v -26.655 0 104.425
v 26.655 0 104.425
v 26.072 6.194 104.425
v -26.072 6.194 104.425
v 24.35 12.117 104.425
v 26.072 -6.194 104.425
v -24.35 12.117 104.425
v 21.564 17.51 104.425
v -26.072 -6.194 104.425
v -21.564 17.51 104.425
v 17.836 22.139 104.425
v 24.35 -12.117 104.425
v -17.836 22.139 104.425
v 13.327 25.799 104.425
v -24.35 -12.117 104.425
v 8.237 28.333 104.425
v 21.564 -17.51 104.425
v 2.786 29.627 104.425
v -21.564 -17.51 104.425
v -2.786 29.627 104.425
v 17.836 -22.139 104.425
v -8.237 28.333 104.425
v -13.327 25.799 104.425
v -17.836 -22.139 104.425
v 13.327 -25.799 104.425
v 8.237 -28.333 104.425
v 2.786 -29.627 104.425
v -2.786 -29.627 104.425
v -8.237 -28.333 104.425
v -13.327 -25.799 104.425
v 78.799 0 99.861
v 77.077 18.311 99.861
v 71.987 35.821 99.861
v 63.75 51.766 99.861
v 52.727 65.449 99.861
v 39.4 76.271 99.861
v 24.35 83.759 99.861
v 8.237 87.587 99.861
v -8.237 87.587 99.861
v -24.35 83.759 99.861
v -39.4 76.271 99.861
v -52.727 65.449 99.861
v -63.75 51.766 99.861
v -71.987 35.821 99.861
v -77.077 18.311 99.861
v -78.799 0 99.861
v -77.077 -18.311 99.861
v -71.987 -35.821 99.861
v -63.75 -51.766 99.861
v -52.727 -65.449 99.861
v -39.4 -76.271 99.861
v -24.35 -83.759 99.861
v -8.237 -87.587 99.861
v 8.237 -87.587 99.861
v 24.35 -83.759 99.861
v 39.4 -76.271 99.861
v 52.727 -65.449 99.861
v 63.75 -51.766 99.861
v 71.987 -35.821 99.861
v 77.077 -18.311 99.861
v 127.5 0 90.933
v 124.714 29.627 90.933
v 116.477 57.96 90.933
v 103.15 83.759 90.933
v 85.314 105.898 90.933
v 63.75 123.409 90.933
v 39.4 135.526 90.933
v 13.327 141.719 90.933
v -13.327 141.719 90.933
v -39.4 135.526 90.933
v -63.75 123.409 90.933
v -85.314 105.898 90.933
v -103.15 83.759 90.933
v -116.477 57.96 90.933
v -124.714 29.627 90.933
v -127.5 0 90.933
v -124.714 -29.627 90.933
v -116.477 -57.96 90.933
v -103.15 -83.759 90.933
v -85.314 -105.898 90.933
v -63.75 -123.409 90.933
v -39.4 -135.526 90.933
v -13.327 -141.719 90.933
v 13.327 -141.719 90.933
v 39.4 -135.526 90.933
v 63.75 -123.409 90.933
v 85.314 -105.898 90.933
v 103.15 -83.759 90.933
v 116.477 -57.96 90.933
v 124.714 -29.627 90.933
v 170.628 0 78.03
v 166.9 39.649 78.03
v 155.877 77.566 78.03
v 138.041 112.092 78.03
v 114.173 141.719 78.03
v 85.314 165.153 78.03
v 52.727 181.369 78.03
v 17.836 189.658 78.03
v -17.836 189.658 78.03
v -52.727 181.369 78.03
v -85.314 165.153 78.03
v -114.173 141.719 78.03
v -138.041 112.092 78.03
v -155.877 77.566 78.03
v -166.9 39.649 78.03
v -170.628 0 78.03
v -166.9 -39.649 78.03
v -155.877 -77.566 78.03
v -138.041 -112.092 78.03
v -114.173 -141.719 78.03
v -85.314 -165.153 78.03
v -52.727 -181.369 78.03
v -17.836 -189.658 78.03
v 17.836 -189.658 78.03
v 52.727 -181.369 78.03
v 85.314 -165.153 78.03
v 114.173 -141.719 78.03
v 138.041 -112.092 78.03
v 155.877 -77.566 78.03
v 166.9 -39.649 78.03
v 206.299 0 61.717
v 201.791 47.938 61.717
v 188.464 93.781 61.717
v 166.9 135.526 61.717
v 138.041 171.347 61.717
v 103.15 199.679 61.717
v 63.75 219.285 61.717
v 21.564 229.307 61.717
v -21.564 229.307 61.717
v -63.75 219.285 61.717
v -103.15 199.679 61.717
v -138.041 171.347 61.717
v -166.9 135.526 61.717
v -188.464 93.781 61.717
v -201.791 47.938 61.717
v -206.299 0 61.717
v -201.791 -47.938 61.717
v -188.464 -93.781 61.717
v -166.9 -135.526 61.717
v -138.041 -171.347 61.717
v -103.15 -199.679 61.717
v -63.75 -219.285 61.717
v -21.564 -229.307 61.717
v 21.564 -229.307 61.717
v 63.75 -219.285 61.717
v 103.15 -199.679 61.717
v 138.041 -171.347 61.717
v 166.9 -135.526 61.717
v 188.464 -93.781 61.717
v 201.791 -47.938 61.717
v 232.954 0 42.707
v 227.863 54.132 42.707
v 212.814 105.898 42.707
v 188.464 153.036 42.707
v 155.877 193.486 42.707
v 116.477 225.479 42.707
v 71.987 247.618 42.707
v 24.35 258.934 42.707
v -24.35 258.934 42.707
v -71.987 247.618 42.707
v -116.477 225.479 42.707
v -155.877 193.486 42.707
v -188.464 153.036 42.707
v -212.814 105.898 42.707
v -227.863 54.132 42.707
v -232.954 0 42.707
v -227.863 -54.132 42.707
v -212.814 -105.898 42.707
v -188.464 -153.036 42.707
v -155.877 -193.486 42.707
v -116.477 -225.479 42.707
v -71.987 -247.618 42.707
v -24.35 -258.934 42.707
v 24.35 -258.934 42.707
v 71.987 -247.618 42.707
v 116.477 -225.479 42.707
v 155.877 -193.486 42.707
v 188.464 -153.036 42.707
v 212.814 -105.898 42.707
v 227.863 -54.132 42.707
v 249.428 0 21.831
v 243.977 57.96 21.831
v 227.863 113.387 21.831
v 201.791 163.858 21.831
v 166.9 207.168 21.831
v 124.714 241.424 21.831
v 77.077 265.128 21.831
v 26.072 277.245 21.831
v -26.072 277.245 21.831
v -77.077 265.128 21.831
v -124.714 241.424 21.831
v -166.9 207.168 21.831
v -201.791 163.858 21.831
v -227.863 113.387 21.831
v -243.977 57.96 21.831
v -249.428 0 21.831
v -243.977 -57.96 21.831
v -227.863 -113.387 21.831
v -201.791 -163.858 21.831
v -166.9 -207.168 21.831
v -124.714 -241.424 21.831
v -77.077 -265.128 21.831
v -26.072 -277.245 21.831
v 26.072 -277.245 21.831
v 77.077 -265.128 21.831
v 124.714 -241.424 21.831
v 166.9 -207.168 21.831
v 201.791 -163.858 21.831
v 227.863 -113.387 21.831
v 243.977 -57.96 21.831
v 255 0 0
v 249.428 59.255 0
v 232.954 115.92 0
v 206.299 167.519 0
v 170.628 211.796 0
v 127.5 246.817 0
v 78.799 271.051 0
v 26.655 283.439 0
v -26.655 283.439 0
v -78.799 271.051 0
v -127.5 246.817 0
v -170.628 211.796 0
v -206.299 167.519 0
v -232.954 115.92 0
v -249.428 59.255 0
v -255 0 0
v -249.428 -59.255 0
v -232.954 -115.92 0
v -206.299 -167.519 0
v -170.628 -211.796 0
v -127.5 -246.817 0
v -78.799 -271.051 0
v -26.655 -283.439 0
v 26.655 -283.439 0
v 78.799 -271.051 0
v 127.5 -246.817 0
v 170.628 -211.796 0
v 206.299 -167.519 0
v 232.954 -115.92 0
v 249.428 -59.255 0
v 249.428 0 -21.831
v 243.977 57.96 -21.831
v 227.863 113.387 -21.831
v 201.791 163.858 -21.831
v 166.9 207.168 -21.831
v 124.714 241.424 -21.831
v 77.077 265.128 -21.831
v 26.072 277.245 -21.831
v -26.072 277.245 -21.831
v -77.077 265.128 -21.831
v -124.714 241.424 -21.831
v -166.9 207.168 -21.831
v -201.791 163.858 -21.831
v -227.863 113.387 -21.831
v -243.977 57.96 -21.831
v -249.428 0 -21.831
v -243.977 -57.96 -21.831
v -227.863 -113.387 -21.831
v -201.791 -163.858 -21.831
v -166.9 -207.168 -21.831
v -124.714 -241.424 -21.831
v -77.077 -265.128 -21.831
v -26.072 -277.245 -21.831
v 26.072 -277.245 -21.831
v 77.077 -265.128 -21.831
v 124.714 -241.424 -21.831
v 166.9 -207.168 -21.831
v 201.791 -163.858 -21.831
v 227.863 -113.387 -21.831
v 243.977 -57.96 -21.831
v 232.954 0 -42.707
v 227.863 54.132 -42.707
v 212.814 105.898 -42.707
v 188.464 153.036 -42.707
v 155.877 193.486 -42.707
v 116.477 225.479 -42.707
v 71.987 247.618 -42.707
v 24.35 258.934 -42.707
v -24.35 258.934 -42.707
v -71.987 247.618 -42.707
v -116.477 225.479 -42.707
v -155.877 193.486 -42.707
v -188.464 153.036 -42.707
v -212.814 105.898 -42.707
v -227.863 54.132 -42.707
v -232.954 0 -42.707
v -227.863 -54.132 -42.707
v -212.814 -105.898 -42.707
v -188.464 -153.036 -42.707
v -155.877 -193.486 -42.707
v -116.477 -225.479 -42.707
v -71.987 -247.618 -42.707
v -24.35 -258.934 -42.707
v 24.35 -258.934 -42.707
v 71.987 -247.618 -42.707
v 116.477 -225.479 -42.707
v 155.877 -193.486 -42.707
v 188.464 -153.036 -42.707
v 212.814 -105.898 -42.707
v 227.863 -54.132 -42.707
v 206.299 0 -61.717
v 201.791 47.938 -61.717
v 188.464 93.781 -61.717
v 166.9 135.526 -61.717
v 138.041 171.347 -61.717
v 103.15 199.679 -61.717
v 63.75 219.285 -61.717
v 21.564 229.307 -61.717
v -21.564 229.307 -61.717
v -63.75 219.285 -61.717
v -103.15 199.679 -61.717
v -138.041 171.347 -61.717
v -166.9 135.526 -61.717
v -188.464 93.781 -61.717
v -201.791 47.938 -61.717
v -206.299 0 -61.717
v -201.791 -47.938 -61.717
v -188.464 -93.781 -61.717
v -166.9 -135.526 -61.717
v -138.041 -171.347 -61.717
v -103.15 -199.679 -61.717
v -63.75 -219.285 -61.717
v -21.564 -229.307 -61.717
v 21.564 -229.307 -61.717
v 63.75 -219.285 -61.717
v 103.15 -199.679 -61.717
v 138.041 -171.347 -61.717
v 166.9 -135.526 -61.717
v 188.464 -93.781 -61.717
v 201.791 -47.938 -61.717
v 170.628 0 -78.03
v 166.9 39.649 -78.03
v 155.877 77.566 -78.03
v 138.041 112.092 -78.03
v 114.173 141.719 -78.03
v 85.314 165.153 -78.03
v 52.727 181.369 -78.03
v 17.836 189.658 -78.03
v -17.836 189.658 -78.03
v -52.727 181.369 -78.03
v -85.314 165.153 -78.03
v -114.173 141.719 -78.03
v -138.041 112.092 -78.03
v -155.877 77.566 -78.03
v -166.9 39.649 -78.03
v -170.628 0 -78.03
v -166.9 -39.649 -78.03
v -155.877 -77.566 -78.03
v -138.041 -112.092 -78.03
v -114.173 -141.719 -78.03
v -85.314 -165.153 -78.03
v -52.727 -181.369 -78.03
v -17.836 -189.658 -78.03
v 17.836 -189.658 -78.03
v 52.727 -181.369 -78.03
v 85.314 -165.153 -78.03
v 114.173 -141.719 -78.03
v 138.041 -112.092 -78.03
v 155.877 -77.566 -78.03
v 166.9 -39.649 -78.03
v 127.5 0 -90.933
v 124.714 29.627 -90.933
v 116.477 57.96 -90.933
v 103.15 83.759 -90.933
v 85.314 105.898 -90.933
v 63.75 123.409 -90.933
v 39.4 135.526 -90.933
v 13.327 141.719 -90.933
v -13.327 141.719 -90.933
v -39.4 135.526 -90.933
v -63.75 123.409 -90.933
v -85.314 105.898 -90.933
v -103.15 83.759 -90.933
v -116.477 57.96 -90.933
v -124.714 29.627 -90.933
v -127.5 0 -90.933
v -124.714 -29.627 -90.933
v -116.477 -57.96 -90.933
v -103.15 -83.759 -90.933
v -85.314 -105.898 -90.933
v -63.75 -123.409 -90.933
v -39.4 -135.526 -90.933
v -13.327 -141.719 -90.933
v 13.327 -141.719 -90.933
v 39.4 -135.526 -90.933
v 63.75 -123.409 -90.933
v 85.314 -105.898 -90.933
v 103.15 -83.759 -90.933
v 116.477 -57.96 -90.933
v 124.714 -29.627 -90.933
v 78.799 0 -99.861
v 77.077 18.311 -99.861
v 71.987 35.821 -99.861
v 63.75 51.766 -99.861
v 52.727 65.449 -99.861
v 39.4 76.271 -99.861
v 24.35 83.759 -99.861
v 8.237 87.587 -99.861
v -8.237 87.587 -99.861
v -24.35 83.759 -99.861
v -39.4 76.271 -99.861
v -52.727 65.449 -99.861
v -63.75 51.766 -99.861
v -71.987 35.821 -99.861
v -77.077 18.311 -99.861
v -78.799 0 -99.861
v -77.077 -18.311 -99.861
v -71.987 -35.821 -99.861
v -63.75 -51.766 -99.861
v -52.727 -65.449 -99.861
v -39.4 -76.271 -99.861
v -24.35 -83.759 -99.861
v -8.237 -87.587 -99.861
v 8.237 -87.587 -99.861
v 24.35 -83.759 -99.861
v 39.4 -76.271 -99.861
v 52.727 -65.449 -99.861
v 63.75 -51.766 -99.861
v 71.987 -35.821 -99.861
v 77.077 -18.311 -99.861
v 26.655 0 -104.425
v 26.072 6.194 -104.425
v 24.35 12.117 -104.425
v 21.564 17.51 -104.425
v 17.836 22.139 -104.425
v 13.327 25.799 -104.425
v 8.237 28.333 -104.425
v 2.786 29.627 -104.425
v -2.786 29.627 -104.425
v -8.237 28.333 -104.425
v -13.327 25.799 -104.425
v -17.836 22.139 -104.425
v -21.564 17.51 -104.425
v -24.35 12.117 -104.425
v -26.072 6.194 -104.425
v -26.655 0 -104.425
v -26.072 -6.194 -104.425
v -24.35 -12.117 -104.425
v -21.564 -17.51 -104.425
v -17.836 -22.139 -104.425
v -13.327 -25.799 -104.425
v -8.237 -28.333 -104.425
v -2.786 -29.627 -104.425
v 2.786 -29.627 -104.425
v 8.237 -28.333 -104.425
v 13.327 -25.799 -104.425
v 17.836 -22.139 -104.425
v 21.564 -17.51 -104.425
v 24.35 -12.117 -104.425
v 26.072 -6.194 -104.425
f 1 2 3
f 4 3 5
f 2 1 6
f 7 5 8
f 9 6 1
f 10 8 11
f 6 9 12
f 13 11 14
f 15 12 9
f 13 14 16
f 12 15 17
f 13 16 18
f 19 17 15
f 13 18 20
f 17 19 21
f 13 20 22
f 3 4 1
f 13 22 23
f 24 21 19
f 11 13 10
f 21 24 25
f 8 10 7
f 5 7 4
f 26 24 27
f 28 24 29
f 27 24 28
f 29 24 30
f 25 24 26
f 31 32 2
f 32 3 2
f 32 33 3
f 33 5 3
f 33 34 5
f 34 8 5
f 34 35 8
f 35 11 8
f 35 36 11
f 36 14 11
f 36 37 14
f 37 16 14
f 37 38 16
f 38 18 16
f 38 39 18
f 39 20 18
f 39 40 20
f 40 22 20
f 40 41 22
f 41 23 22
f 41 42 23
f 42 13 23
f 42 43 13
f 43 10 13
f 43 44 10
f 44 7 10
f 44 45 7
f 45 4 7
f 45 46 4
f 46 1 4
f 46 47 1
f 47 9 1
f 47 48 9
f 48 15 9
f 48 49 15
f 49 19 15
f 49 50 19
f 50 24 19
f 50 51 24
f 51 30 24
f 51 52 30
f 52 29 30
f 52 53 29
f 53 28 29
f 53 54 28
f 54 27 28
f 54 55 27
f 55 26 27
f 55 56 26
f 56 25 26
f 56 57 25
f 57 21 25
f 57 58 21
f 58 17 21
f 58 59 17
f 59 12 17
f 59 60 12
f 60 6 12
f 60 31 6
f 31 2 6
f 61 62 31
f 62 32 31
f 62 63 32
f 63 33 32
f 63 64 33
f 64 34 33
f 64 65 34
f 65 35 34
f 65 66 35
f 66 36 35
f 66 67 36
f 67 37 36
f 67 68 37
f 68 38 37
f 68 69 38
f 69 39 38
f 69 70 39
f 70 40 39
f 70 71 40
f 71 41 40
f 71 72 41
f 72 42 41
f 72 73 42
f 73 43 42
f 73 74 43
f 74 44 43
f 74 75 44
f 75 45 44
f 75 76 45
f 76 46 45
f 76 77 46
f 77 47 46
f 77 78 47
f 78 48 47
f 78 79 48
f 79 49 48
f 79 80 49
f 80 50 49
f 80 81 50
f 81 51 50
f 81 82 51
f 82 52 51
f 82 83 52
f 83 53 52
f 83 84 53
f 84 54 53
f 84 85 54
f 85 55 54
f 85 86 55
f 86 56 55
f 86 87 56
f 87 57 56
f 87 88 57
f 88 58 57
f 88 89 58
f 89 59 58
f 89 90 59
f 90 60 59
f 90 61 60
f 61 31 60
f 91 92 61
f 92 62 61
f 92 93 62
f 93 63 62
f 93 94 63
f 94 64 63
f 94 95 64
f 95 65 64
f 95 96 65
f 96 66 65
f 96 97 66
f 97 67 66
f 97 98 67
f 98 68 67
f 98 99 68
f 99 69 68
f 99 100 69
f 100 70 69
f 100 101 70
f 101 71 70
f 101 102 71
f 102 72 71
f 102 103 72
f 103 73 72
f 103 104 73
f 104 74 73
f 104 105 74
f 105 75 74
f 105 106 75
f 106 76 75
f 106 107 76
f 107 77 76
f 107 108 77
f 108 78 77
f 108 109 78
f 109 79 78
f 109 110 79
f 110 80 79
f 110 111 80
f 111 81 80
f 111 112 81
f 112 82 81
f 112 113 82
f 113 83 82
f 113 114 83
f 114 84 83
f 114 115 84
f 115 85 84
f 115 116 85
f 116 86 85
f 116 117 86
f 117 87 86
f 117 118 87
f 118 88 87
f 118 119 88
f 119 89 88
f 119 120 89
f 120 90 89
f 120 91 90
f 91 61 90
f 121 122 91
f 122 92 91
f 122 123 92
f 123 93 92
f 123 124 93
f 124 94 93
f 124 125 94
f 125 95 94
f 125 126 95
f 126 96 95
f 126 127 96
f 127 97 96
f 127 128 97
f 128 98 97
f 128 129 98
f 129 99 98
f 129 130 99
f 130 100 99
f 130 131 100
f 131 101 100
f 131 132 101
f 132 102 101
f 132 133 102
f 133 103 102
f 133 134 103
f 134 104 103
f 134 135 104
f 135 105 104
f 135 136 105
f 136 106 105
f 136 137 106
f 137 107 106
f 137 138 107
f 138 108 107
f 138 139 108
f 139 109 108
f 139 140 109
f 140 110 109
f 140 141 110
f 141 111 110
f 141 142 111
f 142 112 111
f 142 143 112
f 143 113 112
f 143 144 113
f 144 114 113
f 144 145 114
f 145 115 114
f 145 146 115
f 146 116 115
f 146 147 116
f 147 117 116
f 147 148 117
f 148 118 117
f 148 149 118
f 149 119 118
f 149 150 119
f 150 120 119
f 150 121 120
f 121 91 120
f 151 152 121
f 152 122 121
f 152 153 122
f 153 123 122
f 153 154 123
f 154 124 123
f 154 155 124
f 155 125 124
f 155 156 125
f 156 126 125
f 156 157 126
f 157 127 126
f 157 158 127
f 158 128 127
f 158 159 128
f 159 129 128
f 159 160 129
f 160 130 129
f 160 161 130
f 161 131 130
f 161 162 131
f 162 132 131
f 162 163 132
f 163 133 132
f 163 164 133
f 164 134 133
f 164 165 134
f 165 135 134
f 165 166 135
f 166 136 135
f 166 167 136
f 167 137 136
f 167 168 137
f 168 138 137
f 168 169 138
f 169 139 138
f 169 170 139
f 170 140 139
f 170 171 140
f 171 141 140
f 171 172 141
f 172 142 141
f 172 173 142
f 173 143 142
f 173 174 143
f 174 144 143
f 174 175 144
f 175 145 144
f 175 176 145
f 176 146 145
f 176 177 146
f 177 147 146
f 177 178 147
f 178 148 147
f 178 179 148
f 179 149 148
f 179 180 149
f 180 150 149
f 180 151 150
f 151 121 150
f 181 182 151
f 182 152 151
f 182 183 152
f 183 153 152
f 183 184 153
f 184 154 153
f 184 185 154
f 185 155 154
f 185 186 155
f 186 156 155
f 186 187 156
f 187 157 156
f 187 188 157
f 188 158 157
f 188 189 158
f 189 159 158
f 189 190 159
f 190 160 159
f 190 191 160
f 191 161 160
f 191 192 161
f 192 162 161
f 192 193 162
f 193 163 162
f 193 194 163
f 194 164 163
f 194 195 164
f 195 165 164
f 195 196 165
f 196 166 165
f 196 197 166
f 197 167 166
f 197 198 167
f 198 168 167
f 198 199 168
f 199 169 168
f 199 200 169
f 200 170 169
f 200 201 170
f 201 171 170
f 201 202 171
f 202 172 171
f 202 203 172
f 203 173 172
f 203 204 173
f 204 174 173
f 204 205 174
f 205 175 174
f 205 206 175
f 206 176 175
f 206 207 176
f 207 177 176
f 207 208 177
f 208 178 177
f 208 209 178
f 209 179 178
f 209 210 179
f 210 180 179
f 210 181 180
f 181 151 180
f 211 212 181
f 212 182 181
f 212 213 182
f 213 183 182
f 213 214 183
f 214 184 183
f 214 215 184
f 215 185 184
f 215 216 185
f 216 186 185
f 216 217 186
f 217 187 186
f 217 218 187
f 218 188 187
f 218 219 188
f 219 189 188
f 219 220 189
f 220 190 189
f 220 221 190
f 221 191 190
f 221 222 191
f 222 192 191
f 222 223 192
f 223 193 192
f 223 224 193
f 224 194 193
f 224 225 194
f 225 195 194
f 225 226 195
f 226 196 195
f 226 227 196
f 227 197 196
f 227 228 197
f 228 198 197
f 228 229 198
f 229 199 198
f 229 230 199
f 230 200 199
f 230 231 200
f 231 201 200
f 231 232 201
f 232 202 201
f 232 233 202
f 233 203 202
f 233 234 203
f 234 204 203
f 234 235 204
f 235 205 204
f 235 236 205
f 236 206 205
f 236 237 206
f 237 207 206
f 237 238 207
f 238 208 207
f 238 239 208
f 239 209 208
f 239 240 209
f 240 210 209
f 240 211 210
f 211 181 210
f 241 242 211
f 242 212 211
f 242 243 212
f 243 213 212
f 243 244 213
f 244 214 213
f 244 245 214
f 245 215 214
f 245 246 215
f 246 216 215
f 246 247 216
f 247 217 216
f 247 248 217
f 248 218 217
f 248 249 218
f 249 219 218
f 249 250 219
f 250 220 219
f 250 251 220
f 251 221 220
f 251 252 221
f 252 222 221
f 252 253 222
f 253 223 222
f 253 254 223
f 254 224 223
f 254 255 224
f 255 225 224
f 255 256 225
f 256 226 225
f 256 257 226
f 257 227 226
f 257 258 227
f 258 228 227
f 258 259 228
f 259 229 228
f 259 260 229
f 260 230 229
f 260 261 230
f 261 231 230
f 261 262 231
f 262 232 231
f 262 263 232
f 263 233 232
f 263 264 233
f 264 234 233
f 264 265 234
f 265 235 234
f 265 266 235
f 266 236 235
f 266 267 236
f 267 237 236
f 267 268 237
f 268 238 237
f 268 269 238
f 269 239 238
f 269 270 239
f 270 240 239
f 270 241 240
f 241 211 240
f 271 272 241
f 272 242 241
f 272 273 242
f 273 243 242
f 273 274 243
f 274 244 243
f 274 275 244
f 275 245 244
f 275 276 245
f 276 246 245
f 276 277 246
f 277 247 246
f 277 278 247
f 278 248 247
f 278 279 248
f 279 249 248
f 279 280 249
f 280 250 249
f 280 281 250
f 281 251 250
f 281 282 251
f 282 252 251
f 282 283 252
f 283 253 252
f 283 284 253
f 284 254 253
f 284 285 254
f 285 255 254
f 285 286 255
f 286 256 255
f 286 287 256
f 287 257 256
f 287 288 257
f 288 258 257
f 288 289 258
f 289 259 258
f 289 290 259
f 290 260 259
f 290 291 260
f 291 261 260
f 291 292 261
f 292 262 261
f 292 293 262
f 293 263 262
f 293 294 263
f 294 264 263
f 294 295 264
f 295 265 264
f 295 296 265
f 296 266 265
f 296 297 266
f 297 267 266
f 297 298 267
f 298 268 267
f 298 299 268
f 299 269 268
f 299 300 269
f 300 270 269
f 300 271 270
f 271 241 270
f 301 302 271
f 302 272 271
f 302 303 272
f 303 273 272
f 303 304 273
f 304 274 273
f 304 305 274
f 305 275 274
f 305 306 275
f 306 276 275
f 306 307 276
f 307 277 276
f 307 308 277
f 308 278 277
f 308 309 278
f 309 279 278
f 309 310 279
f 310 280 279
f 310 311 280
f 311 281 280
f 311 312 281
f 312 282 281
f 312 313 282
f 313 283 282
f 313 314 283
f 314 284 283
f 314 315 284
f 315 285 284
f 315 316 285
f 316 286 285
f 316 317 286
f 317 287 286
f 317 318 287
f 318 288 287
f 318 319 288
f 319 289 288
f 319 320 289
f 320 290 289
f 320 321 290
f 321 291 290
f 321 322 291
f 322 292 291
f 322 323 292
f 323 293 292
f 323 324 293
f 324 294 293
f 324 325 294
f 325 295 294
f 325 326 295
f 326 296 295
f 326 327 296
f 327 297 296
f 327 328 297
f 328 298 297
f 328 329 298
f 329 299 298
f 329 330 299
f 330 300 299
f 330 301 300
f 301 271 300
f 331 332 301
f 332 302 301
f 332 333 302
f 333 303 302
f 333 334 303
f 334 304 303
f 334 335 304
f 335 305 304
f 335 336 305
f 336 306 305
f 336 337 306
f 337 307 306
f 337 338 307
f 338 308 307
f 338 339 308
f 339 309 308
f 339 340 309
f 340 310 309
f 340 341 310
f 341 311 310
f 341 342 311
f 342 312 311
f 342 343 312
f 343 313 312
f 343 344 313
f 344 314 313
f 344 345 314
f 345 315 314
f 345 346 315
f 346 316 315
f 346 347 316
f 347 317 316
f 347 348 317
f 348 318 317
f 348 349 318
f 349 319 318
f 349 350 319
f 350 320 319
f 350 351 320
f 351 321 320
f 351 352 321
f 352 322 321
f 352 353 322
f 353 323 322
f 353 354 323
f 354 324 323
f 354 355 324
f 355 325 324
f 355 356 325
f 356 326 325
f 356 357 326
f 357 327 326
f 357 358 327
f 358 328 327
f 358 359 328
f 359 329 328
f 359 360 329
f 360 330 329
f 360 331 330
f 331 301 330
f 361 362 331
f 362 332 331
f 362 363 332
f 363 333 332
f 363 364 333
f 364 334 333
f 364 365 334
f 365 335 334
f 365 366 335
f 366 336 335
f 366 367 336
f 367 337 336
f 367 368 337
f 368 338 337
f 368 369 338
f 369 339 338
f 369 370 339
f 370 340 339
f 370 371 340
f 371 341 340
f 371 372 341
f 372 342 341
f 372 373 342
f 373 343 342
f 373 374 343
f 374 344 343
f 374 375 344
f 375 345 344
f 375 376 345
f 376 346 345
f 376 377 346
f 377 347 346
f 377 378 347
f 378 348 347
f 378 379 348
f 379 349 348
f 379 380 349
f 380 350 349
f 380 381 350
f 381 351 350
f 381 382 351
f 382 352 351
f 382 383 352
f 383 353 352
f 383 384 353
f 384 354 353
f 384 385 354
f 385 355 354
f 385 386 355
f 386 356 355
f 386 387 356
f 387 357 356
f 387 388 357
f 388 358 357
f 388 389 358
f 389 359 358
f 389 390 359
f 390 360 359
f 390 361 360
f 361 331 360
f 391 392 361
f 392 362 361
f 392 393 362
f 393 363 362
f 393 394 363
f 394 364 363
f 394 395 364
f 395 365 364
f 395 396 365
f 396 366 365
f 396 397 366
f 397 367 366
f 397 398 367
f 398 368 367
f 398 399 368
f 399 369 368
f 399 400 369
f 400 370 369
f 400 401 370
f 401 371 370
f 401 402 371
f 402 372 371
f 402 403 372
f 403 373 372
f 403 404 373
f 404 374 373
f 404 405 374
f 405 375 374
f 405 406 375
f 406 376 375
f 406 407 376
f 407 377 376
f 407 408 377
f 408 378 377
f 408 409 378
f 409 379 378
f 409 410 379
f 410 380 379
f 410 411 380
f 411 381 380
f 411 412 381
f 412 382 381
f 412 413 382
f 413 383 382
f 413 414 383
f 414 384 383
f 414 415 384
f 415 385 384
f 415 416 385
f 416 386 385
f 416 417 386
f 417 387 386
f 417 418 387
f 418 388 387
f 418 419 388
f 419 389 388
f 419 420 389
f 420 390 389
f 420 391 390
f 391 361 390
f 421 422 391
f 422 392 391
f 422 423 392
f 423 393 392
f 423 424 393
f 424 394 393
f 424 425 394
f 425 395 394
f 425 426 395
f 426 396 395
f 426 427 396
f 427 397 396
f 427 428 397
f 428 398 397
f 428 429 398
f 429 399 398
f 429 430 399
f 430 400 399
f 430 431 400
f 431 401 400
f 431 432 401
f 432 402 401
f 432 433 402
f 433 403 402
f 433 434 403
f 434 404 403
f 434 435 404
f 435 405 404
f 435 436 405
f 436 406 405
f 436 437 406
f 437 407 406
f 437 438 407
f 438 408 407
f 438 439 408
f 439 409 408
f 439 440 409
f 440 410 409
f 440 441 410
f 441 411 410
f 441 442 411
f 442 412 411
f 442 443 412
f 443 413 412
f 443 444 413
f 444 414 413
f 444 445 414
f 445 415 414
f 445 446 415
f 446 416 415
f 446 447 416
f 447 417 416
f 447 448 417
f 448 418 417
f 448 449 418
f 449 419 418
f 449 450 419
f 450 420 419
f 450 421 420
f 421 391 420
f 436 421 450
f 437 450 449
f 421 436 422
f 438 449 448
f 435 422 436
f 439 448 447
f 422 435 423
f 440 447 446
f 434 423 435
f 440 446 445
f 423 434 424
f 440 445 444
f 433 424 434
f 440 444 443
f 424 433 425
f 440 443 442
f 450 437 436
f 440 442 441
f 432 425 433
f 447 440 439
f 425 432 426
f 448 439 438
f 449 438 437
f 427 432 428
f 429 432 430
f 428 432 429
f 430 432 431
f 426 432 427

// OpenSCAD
// Generated by SolidPython 1.0.1 on 2020-07-29 00:46:53


scale(v = [17, 19, 7]) {
	sphere(r = 15);
}
/***********************************************
*********      SolidPython code:      **********
************************************************
 
# import packages: SolidPython
from solid import *
from solid.utils import *
from itertools import chain, combinations, permutations


class Resize:

    def __init__(self, scad_file):
        self.scad_file = scad_file
        #self.scad_file = import_scad(scad_file)
        # cone/cylinder param:
        self.r1 = 0
        self.r2 = 0
        self.h = 0
        # rectangular prism param:
        self.w = 0
        self.l = 0
        # ellipse param:
        self.r = 0

    # import OpenScad code (file name corresponds to shape)


    # classify shape + parameters
    def assign(self, param1, param2, param3):
        if self.scad_file == 'cone.scad':
            self.r1 = param1
            self.r2 = param2
            self.h = param3
        elif self.scad_file == 'cylinder.scad':
            self.r1 = param1
            self.r2 = param2
            self.h = param3
        elif self.scad_file == 'rectangularPrism.scad':
            self.h = param1
            self.l = param2
            self.w = param3
        else:
            self.r = param1
            self.h = param2

    # resize parameters
    def iterate(self):
        x = range(3, 20, 2)
        i = 1
        if self.scad_file == 'cone.scad':
            tempList = list(permutations(x, 2))
            for temp in tempList:
                param1 = temp[0]
                param2 = temp[1]
                filepath = 'produced_scad_files/' + 'cone' + str(param1) + '_' + str(param2) + '_' + '.scad'
                scad_render_to_file(cylinder(h=param1, r1=param2, r2=0), filepath)

        elif self.scad_file == 'cylinder.scad':
            tempList = list(permutations(x, 3))
            for temp in tempList:
                param1 = temp[0]
                param2 = temp[1]
                filepath = 'produced_scad_files/' + 'cylinder' + str(param1) + '_' + str(param2) + '_' + '.scad'
                scad_render_to_file(cylinder(h=param1, r1=param2, r2=param2), filepath)

        elif self.scad_file == 'rectangularPrism.scad':
            tempList = list(permutations(x, 3))
            for temp in tempList:
                param1 = temp[0]
                param2 = temp[1]
                param3 = temp[2]
                filepath = 'produced_scad_files/' + 'rectangularPrism' + str(param1) + '_' + str(param2) + '_' + str(
                    param3) + '.scad'
                scad_render_to_file(cube(size=(param1, param2, param3)), filepath)

        elif self.scad_file == 'ellipse.scad':
            tempList = list(permutations(x, 4))
            for temp in tempList:
                param1 = temp[0]
                param2 = temp[1]
                param3 = temp[2]
                param4 = temp[3]
                filepath = 'produced_scad_files/' + 'ellipse' + str(param1) + '_' + str(param2) + '_' + str(param3) + '_' + str(param4) + '.scad'
                scad_render_to_file(scale([param1, param2, param3])(sphere(r=param4)), filepath)

    def render_to_scadfile(self):
        scad_render_to_file(scad, 'example.scad') 
 
************************************************/
